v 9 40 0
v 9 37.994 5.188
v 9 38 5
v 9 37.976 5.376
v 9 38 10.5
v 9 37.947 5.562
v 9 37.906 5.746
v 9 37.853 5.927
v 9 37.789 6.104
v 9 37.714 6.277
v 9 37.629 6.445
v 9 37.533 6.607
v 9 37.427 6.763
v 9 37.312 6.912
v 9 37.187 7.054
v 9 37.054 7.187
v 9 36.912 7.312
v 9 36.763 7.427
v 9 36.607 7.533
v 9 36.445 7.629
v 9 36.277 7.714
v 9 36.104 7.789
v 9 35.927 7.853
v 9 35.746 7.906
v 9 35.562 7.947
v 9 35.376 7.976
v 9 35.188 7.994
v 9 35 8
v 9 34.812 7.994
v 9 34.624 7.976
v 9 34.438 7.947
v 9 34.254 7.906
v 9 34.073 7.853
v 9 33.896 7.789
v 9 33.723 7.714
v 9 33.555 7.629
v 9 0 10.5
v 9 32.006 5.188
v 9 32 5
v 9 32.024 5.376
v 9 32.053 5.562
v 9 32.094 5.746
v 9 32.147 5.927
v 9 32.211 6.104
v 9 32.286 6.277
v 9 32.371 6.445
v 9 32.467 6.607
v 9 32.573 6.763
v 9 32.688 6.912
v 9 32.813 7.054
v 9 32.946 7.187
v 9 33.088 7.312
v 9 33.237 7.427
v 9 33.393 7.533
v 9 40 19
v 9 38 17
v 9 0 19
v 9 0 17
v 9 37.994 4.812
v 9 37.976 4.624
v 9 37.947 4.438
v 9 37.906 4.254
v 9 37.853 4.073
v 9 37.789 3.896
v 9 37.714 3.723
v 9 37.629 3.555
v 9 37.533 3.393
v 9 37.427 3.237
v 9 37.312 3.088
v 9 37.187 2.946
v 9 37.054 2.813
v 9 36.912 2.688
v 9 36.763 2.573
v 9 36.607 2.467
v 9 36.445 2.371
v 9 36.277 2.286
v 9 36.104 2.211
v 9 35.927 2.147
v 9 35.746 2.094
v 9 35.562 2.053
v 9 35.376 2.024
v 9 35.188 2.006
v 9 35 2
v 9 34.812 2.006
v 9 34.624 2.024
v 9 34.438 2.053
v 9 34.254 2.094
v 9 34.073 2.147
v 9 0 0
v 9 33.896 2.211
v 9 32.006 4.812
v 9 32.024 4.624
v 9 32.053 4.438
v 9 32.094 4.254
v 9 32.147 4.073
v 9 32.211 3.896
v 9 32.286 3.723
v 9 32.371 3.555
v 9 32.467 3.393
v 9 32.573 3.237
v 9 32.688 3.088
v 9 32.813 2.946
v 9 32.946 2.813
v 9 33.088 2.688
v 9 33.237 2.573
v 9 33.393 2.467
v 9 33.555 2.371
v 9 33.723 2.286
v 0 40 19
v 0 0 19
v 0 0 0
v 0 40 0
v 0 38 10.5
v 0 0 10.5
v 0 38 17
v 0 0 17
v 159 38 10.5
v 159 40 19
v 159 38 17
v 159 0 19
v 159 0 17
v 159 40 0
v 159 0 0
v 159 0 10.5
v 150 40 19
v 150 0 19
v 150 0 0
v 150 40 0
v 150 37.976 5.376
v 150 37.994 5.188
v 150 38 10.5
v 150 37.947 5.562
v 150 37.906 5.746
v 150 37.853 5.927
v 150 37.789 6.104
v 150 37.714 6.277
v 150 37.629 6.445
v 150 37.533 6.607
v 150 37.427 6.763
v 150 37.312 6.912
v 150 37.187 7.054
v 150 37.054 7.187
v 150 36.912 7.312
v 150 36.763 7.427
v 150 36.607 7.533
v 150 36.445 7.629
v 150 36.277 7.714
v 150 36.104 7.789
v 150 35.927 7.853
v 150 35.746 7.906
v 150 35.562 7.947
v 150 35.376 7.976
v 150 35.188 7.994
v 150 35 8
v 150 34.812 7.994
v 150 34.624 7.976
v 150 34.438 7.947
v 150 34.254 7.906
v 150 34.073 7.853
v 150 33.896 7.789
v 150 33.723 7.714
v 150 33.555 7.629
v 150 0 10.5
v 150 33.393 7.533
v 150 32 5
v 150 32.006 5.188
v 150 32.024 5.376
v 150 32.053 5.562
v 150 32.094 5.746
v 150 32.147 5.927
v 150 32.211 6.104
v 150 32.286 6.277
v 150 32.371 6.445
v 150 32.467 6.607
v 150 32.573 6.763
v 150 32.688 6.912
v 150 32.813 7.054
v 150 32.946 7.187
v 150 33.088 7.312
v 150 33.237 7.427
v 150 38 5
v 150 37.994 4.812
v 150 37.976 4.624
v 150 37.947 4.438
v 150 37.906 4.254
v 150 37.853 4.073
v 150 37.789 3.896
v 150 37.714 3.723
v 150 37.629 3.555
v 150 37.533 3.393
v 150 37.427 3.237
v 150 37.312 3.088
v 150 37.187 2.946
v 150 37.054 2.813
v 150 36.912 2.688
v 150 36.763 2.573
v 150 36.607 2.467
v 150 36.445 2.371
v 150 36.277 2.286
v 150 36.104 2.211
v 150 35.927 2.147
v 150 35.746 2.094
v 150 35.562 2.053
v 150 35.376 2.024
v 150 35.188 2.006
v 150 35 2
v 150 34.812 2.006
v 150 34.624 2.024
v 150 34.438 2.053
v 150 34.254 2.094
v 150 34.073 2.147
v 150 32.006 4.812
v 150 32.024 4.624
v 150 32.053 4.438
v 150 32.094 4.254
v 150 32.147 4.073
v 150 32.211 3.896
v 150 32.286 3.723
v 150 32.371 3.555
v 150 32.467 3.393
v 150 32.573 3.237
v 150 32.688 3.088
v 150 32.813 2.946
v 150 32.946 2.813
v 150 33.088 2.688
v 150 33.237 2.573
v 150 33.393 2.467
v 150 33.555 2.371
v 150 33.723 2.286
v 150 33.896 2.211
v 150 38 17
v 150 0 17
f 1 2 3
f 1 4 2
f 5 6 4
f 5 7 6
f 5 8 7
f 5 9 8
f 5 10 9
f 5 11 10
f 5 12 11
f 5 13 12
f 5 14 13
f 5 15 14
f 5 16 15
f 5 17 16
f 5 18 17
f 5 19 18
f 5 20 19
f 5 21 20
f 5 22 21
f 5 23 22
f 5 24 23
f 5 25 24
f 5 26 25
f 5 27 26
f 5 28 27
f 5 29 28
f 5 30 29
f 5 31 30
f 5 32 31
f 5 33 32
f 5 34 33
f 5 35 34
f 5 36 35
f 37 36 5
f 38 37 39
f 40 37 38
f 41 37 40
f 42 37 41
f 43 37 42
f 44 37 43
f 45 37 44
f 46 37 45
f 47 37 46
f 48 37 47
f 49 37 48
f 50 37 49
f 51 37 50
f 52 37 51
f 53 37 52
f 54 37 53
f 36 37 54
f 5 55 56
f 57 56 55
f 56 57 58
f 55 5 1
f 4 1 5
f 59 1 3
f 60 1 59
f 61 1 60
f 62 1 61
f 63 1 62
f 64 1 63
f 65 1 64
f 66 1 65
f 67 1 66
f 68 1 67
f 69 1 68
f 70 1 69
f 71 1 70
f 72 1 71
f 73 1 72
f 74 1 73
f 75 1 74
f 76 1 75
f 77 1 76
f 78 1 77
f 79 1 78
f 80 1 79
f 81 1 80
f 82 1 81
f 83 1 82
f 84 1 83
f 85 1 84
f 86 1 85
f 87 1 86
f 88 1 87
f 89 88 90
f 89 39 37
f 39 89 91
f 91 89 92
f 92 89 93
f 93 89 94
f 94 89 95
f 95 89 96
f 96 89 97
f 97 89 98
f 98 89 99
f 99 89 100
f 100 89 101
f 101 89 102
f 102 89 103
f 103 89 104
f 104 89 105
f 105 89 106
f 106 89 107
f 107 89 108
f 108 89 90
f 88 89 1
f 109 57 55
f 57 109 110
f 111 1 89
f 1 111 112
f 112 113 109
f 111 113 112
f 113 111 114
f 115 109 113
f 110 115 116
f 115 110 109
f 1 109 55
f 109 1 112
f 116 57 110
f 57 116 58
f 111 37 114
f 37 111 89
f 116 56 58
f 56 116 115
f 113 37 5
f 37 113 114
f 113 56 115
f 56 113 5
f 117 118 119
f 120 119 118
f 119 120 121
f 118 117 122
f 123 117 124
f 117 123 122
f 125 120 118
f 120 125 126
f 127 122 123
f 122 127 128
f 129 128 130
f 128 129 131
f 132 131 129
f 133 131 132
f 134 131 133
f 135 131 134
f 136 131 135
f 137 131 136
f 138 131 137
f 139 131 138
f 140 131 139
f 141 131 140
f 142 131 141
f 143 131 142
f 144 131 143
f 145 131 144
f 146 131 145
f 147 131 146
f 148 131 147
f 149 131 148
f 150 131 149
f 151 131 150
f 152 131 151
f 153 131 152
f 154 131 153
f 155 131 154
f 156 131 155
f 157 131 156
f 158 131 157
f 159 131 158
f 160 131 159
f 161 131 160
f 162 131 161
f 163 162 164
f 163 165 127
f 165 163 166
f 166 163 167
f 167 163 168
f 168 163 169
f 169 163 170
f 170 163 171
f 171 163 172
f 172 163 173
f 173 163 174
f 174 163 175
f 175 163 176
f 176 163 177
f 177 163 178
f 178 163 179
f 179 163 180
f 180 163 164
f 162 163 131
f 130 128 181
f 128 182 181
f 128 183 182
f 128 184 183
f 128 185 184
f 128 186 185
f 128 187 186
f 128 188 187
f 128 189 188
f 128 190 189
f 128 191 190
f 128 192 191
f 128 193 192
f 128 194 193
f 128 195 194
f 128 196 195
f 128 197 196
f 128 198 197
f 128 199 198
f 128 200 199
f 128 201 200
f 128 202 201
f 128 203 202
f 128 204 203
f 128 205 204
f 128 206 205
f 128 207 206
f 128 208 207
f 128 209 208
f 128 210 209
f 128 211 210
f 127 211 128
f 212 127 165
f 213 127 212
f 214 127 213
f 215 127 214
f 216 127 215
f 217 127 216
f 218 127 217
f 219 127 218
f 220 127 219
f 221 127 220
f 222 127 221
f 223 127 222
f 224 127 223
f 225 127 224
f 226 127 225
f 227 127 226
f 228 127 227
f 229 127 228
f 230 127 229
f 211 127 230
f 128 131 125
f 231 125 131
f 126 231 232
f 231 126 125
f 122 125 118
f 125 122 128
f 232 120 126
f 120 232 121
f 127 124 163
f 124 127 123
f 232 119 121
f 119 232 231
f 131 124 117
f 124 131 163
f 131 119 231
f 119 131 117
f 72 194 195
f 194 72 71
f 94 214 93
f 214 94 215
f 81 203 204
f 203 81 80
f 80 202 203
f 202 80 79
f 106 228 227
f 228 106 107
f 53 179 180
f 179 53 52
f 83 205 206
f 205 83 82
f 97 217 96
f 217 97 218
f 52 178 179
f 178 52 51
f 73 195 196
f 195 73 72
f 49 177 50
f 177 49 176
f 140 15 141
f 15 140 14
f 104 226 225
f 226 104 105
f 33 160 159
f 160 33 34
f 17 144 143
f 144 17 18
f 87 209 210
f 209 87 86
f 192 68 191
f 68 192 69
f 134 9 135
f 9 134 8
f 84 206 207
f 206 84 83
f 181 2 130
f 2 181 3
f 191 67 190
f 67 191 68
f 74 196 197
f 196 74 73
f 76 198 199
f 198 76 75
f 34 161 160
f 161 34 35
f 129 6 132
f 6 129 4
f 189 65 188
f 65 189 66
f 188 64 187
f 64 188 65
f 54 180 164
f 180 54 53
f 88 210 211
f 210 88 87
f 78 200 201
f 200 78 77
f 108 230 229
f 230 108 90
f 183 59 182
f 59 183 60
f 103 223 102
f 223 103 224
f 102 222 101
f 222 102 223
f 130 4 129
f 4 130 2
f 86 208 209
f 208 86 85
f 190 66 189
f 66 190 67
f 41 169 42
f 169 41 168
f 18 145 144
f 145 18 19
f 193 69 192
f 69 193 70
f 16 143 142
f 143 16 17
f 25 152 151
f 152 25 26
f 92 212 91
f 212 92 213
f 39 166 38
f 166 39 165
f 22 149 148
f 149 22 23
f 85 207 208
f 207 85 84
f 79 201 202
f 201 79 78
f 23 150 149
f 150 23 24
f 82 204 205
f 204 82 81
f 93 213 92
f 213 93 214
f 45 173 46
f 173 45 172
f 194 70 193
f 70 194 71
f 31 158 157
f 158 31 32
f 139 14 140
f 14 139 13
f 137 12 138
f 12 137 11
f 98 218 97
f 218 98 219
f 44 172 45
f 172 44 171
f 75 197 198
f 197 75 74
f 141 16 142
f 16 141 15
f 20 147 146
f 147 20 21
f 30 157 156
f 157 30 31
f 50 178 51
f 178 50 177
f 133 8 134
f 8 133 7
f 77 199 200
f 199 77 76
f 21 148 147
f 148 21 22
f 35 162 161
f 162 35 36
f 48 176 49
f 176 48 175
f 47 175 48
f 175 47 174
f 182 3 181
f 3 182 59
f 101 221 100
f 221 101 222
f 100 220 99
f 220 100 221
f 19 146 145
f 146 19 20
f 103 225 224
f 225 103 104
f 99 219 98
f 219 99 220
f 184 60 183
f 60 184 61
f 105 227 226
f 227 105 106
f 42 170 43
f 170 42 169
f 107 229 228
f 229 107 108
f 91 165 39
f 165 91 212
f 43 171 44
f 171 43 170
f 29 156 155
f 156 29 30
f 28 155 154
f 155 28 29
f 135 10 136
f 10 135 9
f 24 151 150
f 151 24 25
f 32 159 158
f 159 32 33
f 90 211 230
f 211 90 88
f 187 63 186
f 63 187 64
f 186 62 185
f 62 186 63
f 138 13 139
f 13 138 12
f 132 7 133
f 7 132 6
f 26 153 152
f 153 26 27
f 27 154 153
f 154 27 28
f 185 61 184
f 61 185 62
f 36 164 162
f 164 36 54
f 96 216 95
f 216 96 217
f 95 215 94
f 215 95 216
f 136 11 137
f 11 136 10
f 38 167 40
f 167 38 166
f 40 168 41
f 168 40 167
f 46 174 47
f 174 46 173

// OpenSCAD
$fn=100;
difference()
{
cube([9,40,19]);
translate([-1,-1,10.5]) cube([10.5,39,6.5]);
}

rotate([0,90,0]) translate([-5,35,0]) cylinder(150,3,3);

difference()
{
translate([150,0,0])cube([9,40,19]);
translate([149,-1,10.5])cube([10.5,39,6.5]);
}
